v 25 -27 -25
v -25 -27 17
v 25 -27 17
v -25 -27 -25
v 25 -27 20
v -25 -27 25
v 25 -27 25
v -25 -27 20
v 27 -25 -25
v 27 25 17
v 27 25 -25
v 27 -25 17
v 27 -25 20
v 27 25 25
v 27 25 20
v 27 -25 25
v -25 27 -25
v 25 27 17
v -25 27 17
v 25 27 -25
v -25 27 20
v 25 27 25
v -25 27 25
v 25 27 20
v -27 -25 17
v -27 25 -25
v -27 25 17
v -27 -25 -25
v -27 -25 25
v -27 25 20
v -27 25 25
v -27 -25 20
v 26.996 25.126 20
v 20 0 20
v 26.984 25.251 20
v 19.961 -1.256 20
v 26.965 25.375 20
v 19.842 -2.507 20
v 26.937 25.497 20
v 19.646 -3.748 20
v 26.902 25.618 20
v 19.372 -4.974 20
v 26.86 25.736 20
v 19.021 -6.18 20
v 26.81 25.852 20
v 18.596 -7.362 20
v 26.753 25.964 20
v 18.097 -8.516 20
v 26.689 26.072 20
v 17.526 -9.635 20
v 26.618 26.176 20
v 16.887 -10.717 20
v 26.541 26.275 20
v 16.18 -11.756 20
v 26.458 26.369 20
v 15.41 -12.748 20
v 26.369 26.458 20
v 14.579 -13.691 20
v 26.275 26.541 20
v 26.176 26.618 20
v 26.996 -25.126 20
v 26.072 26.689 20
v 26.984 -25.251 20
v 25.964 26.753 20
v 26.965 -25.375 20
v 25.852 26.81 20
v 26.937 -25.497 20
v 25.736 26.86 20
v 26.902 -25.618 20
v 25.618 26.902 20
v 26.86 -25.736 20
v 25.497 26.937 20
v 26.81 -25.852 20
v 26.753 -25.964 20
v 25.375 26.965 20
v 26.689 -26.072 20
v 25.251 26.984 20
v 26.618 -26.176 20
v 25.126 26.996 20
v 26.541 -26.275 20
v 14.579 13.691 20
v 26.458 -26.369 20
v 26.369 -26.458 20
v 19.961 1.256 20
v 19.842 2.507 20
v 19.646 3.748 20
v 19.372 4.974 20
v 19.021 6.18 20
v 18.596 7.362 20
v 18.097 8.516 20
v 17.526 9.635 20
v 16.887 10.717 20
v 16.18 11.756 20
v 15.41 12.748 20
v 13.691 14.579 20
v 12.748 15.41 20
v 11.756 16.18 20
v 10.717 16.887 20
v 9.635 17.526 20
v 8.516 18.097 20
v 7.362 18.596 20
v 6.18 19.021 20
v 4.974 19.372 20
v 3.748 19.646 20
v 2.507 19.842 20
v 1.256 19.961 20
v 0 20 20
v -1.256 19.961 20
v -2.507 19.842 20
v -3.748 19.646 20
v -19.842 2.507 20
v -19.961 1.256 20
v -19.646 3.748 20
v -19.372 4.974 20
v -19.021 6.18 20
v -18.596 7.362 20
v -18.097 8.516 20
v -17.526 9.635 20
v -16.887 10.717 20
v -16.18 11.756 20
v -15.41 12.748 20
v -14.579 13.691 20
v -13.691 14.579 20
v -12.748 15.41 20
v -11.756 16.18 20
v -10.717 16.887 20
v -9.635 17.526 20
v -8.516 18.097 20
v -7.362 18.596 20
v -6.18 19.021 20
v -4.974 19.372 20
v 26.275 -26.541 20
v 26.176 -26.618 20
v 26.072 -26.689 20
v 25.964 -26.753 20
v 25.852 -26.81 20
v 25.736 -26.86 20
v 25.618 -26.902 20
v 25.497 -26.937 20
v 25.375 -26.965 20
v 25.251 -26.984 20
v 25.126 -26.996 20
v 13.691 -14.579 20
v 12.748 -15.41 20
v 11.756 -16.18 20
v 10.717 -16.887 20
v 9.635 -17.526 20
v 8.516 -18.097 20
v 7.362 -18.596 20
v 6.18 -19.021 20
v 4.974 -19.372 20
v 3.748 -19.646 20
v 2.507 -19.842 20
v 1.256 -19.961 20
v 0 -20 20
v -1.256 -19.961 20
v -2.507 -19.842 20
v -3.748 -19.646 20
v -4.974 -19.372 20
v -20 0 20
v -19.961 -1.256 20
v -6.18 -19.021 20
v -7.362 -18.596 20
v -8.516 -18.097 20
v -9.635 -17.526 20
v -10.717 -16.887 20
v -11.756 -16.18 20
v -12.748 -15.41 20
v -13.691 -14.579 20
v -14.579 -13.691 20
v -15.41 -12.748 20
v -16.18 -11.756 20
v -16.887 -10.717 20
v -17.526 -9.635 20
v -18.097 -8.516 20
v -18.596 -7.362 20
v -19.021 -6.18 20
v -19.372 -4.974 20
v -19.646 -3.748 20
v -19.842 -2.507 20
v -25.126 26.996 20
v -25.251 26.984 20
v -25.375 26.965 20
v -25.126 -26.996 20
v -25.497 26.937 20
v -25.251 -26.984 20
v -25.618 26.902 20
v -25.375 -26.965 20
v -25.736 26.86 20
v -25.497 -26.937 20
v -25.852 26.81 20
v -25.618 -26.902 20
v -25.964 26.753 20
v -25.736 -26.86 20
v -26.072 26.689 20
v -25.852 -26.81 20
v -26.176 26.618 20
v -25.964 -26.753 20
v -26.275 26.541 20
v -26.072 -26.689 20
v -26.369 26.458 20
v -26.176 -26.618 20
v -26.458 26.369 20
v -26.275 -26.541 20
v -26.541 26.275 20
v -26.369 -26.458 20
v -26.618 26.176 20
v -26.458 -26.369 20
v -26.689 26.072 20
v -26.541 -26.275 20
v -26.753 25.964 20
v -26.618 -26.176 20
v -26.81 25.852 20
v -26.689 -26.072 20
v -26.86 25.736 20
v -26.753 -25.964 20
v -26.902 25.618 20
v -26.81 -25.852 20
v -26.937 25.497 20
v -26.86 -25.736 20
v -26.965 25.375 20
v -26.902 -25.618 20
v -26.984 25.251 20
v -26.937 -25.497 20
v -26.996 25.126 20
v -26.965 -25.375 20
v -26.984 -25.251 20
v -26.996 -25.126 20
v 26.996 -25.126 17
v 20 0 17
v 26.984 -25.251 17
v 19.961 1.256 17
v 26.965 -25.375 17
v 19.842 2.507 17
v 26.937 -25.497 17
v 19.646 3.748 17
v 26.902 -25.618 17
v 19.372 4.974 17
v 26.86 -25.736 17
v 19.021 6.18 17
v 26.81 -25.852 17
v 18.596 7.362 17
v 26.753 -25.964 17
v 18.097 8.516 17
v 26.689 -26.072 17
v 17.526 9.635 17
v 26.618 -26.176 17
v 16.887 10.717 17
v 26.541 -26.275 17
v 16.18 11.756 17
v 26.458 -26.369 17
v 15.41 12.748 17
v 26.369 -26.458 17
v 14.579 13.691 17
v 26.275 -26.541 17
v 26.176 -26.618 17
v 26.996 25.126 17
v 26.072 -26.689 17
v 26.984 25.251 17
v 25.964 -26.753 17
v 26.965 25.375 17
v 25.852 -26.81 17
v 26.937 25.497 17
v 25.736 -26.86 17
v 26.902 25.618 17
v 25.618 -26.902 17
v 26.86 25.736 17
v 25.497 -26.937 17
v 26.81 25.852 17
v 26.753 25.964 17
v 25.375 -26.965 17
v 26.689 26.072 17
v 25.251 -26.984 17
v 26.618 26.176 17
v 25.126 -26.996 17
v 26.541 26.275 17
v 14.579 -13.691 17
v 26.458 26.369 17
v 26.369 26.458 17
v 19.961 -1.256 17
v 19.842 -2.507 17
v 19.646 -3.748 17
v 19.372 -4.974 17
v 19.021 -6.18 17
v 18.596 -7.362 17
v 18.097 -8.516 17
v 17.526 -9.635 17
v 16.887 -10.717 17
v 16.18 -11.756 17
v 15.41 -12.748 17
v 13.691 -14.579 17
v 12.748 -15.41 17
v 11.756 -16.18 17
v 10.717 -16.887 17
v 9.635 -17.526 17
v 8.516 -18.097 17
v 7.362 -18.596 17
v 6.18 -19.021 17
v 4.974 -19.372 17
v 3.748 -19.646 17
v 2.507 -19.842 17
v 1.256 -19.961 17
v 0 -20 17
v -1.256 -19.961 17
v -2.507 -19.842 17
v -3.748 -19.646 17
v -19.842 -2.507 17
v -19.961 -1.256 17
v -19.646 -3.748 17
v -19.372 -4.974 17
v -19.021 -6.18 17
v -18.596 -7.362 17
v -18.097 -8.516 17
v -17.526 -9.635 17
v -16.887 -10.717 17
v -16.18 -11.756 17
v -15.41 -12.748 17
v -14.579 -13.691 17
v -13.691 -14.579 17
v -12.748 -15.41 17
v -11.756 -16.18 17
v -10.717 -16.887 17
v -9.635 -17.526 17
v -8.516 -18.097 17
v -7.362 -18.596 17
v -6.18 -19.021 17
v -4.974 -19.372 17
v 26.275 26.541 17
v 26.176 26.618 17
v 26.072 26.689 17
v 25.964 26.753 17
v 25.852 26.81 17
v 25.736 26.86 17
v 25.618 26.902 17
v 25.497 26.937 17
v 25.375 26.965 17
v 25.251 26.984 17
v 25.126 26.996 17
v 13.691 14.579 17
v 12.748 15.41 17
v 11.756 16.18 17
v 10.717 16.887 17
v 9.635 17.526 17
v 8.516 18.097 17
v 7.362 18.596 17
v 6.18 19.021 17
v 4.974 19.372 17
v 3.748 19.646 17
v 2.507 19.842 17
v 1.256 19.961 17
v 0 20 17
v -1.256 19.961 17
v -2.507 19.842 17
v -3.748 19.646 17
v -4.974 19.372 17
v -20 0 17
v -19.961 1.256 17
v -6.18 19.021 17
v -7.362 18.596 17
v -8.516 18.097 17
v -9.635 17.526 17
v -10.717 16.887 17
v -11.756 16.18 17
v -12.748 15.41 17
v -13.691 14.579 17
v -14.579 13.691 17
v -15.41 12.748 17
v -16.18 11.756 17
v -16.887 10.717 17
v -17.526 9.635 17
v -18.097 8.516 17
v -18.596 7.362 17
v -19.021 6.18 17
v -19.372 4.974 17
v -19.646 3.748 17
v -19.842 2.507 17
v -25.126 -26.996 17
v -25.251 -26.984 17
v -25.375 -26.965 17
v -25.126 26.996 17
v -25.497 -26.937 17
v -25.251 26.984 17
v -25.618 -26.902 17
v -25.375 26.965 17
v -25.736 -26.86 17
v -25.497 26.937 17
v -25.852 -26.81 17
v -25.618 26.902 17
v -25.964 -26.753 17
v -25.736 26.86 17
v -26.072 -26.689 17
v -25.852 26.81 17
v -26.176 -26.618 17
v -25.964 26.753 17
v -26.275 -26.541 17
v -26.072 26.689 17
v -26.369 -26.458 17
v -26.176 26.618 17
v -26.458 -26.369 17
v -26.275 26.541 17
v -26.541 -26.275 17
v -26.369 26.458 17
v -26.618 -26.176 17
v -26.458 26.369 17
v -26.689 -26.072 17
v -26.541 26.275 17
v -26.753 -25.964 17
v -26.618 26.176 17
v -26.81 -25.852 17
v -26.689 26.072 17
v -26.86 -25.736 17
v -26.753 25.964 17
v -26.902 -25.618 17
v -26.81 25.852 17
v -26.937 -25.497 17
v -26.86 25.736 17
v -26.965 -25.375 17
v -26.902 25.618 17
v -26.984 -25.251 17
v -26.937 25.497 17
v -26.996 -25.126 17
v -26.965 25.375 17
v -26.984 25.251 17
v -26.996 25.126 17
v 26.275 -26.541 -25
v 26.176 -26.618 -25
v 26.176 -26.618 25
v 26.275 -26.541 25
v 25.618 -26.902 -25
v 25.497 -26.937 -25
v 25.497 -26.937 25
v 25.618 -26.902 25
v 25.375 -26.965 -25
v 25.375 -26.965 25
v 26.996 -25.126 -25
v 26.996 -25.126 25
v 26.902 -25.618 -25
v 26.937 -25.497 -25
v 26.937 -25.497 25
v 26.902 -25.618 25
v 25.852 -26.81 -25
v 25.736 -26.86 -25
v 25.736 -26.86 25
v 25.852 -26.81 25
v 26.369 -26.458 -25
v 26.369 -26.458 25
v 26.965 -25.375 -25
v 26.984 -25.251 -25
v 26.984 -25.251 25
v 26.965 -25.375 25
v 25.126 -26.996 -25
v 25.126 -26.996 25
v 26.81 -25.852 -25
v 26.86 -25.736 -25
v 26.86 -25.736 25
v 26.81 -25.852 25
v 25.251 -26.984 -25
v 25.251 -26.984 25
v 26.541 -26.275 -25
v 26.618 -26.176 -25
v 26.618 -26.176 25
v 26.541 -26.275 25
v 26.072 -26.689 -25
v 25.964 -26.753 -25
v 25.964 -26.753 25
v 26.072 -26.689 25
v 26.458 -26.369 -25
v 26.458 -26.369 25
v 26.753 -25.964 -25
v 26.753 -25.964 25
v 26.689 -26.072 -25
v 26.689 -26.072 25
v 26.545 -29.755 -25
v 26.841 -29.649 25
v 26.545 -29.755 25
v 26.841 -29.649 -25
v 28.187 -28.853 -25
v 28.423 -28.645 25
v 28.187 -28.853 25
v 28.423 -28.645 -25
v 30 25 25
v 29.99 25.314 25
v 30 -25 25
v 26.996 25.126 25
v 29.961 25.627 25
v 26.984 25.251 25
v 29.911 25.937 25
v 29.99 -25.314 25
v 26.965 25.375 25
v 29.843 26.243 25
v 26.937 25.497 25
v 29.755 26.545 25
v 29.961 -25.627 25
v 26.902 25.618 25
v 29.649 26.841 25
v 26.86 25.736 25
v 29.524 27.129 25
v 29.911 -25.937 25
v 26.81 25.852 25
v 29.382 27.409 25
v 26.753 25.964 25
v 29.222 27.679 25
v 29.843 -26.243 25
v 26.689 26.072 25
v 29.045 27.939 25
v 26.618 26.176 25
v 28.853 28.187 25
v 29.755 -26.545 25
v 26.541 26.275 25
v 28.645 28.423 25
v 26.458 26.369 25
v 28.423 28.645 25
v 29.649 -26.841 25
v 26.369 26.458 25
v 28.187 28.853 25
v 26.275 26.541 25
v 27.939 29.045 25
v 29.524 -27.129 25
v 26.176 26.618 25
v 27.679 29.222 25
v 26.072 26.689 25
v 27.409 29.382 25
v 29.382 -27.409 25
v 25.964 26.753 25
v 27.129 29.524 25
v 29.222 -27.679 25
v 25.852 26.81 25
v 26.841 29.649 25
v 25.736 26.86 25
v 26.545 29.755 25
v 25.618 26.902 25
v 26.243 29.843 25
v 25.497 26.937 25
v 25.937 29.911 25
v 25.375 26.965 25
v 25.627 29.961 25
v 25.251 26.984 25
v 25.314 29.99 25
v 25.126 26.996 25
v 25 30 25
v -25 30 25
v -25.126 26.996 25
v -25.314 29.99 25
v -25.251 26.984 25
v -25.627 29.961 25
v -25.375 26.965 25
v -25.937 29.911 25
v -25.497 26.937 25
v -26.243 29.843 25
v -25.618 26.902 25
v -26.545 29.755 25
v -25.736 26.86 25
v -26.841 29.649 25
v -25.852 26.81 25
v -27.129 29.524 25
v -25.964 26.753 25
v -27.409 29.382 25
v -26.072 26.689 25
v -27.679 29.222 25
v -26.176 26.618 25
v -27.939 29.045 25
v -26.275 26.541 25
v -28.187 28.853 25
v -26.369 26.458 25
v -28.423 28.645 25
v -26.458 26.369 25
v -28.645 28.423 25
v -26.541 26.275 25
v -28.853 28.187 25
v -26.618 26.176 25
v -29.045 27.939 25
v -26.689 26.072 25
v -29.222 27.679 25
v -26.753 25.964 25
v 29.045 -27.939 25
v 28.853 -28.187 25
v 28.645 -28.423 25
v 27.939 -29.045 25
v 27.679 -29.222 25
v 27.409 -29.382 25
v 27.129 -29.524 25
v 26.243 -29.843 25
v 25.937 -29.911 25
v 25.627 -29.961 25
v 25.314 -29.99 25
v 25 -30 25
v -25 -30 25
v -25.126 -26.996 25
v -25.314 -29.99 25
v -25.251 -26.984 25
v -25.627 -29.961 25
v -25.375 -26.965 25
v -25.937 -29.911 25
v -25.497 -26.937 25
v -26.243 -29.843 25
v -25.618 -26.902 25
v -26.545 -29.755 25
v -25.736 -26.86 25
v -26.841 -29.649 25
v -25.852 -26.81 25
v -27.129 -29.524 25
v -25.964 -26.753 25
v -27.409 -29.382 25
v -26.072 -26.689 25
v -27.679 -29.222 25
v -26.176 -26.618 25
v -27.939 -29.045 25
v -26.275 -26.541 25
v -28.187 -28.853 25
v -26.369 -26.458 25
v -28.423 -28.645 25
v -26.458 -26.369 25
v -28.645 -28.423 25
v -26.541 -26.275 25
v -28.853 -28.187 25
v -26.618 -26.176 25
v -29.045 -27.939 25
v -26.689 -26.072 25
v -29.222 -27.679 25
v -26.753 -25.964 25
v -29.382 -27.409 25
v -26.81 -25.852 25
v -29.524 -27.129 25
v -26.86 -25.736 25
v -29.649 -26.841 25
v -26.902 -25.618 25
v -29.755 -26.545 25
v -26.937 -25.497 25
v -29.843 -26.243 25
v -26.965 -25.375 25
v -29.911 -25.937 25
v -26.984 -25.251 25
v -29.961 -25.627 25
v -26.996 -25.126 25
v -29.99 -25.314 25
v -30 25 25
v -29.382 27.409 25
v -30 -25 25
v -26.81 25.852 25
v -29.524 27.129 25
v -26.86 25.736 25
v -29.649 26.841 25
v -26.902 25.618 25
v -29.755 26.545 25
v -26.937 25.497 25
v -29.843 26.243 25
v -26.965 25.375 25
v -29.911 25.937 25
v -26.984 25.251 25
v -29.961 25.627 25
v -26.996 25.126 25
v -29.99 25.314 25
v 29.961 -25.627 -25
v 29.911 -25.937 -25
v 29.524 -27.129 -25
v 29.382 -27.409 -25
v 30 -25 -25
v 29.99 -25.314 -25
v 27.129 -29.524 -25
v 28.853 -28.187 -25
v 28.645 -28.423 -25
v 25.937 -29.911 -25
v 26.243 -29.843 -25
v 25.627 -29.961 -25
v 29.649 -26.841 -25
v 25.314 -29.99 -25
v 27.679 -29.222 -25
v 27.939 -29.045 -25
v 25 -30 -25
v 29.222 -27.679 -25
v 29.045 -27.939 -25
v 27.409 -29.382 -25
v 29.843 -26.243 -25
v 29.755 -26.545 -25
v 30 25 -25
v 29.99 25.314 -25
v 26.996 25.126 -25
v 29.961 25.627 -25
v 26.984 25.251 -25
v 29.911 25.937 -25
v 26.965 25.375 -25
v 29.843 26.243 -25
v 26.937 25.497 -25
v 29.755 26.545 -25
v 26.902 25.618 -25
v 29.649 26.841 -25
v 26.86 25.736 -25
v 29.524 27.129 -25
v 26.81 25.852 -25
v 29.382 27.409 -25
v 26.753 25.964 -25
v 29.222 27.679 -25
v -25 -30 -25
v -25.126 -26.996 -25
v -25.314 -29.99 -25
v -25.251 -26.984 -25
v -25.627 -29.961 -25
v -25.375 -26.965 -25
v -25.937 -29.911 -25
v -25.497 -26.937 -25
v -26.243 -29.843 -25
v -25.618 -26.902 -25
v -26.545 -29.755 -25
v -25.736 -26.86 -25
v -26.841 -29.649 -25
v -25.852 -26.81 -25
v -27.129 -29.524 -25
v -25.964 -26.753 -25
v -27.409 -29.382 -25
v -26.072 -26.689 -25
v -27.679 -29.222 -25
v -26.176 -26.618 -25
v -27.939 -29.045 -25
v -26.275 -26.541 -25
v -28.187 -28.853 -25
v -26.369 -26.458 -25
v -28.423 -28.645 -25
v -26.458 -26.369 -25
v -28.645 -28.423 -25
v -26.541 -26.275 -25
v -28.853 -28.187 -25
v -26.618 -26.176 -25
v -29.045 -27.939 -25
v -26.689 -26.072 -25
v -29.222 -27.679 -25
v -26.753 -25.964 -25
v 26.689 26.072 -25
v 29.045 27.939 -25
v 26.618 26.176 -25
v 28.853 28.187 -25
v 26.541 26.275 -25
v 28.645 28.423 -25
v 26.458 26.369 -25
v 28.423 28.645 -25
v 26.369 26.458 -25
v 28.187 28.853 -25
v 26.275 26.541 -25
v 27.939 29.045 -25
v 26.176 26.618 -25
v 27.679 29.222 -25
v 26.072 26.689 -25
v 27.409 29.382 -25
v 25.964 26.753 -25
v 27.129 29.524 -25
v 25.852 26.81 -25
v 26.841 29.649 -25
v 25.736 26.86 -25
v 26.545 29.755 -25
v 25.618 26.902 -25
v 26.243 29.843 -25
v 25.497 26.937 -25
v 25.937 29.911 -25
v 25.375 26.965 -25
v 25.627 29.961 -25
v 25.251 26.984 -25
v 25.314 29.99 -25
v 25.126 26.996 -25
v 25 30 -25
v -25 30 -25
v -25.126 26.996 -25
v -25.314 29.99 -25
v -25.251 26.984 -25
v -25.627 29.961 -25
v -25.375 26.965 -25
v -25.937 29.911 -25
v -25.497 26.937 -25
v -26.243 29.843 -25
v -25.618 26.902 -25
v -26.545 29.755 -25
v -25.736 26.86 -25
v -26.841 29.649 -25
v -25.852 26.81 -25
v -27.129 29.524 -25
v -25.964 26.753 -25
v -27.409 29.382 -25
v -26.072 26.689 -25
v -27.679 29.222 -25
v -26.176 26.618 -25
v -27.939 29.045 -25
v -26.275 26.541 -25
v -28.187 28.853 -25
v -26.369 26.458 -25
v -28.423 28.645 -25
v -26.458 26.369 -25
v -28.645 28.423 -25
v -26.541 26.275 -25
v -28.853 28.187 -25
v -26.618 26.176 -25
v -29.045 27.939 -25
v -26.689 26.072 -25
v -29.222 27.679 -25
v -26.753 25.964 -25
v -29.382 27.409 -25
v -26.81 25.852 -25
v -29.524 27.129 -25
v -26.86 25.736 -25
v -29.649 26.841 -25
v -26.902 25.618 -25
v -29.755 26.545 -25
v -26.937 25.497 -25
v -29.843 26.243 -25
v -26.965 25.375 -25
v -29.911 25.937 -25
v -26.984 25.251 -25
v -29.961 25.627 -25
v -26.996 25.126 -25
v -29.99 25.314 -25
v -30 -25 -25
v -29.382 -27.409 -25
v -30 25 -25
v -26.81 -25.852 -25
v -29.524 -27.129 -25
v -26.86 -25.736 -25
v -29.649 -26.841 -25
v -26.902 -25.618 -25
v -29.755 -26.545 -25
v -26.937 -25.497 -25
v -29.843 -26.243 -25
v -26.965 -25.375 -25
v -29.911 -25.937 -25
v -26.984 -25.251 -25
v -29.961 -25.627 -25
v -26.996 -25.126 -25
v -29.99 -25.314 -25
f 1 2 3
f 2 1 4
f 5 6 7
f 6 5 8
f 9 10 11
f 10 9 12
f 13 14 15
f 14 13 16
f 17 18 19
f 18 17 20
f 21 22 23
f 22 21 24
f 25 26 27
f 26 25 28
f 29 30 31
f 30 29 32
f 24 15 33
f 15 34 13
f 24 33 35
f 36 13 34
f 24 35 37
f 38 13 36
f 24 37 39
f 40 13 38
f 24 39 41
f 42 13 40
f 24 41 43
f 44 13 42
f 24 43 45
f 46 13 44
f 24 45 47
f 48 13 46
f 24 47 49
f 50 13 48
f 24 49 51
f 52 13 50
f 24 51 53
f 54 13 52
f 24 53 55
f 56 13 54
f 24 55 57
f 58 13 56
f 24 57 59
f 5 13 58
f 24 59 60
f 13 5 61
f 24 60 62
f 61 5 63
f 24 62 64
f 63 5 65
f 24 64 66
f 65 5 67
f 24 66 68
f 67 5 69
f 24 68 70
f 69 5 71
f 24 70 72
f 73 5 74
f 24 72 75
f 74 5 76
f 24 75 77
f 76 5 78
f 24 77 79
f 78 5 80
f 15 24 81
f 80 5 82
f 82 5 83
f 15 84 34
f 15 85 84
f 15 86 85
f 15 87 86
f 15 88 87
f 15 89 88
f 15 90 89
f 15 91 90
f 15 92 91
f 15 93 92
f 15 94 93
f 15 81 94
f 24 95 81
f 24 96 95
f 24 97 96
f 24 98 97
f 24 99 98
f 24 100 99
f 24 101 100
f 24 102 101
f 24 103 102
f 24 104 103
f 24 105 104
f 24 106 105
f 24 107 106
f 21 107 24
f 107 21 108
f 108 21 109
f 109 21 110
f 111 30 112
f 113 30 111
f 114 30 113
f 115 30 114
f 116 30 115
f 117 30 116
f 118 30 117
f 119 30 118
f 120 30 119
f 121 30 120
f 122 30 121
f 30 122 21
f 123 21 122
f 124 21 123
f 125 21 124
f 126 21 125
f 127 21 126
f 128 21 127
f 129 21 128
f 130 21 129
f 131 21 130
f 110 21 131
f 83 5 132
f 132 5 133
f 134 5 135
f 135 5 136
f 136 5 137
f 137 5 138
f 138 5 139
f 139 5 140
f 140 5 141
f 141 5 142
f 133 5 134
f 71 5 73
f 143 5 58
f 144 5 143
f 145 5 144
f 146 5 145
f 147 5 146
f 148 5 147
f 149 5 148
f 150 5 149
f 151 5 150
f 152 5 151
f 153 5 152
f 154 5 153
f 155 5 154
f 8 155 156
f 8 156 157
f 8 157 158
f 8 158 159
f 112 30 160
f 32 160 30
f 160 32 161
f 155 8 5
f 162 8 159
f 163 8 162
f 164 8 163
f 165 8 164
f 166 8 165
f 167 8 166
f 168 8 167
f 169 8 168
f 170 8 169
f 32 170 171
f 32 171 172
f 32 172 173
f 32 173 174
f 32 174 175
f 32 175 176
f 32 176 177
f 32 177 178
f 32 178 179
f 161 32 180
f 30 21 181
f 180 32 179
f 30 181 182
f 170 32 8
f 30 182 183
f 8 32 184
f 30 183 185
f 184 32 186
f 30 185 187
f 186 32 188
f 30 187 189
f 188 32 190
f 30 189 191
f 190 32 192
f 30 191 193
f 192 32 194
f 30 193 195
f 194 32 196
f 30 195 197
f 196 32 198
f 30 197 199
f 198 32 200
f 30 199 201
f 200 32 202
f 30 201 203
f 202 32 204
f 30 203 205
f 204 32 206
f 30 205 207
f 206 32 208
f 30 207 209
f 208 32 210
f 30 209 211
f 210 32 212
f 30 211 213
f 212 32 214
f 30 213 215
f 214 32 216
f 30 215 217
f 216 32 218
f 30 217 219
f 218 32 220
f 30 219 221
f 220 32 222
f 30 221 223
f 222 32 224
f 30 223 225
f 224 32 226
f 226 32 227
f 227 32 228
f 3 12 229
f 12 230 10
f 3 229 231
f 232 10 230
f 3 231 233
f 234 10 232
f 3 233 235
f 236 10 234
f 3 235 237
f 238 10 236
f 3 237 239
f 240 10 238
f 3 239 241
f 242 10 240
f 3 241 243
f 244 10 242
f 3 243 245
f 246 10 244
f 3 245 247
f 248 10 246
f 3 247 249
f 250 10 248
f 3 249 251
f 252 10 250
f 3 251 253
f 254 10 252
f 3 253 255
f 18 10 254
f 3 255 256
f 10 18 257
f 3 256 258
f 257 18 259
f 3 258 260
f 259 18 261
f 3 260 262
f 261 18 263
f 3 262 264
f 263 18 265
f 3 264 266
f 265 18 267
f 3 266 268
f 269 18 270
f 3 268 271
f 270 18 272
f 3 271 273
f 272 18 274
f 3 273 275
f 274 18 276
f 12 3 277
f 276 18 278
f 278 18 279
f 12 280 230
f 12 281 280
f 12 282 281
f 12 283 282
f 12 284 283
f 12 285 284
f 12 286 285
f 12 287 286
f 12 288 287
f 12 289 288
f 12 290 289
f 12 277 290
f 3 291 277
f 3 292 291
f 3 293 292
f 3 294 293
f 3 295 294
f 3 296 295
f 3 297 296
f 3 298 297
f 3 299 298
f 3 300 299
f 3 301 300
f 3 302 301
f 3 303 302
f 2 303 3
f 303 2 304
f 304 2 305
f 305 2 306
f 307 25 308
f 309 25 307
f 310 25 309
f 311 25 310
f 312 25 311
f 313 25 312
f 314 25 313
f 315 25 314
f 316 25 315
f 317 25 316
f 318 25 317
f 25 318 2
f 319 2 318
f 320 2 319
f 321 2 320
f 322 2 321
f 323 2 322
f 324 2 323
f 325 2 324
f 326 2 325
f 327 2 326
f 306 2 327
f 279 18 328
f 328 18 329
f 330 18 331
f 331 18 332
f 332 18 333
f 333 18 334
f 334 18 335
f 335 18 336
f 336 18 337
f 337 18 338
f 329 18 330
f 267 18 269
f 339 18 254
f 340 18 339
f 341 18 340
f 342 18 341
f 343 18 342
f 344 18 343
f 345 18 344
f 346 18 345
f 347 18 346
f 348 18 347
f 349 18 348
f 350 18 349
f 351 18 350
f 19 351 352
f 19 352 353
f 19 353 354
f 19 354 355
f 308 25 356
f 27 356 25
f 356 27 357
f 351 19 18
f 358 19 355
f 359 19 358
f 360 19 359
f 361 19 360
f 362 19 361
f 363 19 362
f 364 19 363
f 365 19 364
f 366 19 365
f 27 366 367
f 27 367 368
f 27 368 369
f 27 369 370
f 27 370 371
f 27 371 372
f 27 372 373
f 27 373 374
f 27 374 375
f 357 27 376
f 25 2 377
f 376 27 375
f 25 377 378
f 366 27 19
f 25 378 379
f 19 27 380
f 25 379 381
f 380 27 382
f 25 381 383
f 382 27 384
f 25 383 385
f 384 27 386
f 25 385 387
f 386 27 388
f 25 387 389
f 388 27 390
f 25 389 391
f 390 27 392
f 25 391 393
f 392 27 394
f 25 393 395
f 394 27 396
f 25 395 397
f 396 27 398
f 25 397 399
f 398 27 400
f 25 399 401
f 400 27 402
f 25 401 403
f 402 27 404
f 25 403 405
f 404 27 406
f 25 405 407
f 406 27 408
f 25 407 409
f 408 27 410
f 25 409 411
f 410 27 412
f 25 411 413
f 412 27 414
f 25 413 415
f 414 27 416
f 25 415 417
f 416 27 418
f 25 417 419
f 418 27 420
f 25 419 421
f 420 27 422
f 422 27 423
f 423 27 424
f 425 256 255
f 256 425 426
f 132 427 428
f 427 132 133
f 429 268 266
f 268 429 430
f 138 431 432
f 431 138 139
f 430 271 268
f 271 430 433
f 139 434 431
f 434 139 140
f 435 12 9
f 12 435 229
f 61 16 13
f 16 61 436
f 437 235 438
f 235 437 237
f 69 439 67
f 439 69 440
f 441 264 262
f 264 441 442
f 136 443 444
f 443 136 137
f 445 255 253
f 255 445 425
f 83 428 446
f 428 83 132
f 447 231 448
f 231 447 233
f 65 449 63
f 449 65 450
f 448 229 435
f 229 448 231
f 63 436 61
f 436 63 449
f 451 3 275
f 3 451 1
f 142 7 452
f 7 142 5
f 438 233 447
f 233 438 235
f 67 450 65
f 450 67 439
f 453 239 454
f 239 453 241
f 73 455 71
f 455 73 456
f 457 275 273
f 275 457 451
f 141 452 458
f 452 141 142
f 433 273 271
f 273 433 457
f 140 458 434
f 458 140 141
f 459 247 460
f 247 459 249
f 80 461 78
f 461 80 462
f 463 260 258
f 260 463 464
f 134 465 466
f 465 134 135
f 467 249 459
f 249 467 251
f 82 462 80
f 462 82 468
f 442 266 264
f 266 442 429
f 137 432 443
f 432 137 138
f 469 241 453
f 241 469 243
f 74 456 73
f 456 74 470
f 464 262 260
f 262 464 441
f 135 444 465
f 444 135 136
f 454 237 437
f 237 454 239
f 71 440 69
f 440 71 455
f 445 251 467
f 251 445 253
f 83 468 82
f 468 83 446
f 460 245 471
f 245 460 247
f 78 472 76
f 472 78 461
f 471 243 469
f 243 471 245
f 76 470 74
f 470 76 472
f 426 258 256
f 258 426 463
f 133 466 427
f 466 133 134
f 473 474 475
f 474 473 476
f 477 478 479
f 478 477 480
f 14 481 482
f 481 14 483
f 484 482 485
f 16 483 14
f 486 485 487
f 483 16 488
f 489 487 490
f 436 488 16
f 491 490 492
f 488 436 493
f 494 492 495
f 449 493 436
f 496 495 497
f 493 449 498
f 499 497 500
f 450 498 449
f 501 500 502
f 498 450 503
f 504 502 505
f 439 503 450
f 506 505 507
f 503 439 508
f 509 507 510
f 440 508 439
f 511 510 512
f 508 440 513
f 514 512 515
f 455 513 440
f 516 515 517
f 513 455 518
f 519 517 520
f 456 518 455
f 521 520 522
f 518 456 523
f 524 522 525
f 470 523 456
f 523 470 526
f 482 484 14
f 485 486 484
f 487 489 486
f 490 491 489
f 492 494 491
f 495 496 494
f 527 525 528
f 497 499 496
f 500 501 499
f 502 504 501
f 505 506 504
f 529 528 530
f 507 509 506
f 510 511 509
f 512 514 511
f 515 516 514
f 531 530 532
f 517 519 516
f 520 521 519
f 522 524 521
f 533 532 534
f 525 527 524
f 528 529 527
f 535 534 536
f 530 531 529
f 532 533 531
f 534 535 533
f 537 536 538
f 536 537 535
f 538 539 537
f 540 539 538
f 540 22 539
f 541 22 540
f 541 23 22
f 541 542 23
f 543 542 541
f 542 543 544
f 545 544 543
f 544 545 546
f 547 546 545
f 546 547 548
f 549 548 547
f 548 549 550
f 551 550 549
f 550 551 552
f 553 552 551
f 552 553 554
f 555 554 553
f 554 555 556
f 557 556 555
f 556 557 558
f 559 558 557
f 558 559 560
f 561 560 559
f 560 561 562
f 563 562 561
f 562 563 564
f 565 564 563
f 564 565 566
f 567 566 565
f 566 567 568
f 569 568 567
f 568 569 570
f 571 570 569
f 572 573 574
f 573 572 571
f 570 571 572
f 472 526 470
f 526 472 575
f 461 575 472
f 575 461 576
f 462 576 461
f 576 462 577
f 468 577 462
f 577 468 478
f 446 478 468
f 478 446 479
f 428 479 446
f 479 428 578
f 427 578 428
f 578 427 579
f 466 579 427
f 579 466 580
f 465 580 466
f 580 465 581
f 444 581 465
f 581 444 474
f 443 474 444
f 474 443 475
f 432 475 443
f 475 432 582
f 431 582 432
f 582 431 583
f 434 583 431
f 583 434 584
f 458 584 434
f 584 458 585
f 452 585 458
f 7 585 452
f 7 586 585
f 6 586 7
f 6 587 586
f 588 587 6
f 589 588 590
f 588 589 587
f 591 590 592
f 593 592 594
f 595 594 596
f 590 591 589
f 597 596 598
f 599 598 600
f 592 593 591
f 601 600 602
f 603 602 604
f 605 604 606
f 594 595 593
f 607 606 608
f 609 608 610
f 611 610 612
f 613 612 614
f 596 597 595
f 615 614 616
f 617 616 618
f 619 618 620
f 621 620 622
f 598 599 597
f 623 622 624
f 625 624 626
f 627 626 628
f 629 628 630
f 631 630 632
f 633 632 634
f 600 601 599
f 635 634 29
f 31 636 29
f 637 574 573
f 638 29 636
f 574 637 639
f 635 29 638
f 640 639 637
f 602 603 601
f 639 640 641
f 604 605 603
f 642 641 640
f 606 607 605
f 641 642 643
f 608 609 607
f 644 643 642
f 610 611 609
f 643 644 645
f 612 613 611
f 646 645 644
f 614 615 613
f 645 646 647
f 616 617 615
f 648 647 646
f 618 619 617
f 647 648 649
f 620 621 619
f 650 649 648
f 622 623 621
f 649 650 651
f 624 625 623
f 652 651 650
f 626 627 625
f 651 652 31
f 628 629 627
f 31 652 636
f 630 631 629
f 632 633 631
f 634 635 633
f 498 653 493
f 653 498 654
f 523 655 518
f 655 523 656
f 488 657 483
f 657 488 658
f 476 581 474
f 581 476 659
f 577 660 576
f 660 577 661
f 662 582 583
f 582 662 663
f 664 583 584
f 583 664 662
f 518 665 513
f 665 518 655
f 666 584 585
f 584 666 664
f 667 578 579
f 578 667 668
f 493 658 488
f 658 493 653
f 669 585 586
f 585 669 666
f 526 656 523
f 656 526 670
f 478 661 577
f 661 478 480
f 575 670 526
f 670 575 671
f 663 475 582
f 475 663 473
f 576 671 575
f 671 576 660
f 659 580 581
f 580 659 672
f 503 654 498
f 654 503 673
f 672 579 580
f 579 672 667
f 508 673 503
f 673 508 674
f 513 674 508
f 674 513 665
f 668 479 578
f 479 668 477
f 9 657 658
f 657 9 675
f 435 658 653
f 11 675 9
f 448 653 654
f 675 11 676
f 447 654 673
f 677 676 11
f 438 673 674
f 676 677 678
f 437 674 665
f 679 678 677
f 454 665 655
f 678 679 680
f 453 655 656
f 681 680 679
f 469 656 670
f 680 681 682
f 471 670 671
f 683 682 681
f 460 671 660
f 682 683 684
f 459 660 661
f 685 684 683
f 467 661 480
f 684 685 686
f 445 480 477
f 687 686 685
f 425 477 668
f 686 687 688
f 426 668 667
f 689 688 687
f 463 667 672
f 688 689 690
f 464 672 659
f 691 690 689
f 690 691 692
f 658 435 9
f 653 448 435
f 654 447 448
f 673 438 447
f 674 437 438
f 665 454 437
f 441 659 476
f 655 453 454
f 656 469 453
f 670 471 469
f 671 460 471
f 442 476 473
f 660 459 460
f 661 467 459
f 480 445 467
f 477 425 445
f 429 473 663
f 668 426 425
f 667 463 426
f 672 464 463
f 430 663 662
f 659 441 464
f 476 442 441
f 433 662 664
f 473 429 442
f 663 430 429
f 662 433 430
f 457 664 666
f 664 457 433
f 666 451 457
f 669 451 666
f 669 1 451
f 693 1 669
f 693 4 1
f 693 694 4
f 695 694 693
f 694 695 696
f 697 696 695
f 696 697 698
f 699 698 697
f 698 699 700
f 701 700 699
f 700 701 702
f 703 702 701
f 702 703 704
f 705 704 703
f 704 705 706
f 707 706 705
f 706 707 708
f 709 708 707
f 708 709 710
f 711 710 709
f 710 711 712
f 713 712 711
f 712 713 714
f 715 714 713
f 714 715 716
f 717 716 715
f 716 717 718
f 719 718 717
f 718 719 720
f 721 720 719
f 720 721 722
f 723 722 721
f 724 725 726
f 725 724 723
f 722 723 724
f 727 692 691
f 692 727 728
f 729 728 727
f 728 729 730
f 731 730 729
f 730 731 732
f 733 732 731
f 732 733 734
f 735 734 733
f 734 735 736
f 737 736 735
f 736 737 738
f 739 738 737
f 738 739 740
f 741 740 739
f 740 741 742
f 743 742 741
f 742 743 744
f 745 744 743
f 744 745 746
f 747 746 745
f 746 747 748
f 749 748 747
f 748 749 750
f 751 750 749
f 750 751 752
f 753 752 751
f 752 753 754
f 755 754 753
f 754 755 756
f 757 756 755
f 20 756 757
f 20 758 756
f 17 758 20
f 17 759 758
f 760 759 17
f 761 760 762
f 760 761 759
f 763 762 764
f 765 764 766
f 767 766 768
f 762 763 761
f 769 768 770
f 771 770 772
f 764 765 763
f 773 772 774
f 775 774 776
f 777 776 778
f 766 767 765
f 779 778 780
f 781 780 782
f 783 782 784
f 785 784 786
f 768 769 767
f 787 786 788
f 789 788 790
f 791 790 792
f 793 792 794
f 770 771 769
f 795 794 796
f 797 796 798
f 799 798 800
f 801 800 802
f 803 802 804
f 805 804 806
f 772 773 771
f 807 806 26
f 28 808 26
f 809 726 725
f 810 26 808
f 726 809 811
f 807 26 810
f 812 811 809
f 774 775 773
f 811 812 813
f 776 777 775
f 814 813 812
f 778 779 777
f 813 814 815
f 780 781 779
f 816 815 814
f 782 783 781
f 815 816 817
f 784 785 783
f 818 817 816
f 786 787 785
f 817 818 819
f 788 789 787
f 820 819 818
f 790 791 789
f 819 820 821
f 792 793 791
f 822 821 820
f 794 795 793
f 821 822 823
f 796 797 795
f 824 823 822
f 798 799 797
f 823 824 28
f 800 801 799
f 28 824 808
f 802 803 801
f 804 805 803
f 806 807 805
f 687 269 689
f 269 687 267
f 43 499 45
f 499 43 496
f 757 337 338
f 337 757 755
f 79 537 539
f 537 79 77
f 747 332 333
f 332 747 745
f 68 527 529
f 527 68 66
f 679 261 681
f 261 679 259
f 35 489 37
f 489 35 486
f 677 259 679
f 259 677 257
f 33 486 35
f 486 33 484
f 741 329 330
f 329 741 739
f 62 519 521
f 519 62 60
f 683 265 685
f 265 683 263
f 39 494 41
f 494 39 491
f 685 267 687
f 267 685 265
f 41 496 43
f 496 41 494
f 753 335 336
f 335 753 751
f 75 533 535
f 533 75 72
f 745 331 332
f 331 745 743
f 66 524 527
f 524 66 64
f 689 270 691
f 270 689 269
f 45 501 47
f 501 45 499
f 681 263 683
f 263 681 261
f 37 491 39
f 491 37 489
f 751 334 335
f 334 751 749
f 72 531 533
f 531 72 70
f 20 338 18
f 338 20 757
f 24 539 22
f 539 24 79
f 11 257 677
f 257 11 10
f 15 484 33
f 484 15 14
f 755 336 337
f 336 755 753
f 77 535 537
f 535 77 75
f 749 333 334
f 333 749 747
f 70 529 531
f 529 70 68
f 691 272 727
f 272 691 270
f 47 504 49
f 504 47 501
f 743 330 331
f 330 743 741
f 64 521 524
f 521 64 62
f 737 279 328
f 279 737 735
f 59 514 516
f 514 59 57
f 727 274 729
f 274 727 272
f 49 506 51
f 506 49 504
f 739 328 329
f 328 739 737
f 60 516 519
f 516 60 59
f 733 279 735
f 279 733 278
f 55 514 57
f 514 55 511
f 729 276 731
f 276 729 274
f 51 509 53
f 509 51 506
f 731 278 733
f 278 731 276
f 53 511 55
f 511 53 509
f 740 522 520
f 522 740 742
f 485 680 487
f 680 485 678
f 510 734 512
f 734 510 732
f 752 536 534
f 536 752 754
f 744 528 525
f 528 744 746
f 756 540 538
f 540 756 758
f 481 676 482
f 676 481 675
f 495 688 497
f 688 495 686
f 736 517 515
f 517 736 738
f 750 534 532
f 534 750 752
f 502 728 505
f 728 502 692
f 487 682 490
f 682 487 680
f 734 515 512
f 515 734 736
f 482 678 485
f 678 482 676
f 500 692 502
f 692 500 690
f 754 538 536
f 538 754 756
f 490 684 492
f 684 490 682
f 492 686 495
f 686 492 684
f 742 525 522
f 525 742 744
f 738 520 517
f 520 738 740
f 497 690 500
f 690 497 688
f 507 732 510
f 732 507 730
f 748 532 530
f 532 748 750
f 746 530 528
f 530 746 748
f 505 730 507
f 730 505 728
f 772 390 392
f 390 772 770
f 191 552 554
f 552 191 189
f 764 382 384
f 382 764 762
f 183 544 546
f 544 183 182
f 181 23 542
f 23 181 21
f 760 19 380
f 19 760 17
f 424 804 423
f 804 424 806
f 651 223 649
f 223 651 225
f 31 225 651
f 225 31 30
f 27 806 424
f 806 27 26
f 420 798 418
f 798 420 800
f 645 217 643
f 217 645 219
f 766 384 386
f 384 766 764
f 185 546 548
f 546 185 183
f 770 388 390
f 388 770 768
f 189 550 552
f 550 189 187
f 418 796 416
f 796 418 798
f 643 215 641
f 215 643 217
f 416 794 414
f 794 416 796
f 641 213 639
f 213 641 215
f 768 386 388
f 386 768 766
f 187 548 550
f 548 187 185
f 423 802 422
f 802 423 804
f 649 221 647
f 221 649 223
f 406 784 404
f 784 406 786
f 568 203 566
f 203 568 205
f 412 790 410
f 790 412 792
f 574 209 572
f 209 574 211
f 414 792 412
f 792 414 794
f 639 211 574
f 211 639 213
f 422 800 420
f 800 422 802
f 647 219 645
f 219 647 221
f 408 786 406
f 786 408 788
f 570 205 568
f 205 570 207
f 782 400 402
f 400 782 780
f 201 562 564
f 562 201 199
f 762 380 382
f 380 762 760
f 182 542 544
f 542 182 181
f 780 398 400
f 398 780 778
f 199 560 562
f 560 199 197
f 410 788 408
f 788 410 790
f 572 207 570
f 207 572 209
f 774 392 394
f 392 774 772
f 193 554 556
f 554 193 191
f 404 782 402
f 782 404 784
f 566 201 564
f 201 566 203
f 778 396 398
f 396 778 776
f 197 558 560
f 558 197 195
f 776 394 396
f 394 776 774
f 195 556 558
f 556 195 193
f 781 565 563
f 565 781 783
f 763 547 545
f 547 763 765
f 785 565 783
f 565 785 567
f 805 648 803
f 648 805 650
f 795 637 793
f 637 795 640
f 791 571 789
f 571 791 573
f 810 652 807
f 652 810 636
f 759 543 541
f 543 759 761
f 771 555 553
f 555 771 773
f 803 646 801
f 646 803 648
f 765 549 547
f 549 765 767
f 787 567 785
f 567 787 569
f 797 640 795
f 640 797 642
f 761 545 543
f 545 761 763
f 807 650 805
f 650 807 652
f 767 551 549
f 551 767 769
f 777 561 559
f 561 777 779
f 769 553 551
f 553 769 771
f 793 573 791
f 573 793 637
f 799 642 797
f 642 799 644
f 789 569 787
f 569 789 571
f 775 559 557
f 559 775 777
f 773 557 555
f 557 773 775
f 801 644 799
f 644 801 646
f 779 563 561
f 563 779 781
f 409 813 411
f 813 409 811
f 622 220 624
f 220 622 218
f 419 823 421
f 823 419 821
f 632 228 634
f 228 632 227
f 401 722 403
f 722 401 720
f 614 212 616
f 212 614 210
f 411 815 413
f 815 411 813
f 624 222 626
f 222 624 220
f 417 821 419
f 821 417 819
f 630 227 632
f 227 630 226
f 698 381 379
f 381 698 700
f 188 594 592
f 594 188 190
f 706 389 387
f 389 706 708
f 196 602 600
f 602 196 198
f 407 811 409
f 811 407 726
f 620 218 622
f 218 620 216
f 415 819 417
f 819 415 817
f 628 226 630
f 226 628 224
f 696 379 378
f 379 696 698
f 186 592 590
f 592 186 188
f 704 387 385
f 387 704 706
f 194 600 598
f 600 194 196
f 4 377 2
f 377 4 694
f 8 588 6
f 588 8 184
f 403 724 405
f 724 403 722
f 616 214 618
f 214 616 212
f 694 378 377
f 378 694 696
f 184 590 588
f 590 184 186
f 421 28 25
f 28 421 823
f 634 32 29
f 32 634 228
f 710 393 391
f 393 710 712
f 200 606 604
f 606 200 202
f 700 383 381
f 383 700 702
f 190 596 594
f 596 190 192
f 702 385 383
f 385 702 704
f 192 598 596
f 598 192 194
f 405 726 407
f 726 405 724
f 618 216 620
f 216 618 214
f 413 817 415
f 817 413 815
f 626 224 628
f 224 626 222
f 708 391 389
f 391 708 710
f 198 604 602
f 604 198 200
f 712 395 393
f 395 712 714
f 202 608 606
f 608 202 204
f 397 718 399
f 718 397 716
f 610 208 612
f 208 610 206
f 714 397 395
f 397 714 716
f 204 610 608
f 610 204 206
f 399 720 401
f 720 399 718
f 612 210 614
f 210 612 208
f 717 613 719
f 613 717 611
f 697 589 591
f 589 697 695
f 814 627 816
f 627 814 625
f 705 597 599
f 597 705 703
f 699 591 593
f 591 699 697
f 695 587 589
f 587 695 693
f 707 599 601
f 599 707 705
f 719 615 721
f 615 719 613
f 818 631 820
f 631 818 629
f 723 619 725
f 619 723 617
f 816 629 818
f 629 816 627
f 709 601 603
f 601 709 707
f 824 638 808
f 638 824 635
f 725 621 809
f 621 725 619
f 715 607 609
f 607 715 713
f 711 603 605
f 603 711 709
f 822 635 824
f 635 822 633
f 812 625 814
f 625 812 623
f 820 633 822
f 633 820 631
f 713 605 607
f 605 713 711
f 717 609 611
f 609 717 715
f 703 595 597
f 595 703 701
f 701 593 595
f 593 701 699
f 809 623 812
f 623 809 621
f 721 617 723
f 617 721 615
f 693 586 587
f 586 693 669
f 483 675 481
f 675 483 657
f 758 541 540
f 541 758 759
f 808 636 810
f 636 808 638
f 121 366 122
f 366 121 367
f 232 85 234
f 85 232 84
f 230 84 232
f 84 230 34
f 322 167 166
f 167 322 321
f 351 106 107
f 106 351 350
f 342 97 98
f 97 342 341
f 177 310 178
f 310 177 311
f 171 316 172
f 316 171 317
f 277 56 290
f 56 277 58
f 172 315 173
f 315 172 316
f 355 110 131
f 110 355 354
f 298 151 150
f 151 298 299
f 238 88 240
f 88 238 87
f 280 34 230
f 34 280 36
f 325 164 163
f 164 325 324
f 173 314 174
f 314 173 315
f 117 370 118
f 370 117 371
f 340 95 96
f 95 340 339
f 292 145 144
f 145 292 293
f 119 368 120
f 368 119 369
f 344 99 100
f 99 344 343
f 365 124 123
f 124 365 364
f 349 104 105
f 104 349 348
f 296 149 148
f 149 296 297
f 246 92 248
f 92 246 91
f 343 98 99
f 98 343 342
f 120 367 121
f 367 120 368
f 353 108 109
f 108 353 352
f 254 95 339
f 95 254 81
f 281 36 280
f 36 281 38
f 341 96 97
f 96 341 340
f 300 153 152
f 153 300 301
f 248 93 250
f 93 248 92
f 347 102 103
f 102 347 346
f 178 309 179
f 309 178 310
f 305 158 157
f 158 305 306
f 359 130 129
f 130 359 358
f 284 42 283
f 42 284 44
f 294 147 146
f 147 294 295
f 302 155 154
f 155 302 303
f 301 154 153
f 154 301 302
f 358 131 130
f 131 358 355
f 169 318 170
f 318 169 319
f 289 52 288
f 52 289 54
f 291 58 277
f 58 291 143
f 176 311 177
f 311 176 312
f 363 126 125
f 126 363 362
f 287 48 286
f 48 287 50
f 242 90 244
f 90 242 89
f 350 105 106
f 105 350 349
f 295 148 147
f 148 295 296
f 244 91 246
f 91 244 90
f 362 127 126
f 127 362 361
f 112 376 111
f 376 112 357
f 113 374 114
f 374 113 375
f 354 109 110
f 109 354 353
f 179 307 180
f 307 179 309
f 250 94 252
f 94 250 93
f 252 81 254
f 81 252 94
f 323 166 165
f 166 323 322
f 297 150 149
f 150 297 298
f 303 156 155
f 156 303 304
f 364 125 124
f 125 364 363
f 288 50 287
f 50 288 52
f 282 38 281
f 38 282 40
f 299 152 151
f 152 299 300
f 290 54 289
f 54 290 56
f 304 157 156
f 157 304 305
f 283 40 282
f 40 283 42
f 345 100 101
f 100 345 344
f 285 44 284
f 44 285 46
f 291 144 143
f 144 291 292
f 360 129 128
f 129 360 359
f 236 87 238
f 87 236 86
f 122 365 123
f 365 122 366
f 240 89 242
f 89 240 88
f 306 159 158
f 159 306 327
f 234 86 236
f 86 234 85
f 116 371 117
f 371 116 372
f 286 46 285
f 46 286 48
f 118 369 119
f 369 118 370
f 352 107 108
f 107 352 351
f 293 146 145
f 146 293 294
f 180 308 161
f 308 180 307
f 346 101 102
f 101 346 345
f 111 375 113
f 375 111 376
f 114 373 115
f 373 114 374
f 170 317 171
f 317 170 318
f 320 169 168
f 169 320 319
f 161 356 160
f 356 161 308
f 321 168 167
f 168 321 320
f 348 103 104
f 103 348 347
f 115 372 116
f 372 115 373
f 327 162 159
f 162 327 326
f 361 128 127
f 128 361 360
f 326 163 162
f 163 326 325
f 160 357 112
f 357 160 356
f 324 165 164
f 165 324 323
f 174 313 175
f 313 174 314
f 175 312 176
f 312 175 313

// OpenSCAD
//CUSTOMIZER VARIABLES

//	Number of sides for the Microphone flag
number_of_sides = 4;	//	[3:12]

//	This is the width of the logo area, margin for the rounding will be added (mm)
width_of_logo = 50;

//	This is the height of the logo area (mm)
height_of_logo = 50;

//	This is the diameter of the hole for the microphone (mm)
hole_diameter = 40;

//	Here you can select if you want a bottom plate too, or just the top one
use_bottom = "false";	//	[true,false]

//CUSTOMIZER VARIABLES END

resolution = 100*1;

module flag(size, height, sides, hole, bottom)
{
	difference()
	{
		union()
		{
			difference()
			{
				union()
				{
					translate([0, 0, height/2-3/2-5])
						cylinder(h = 3, r1 = sqrt((tan((90+((sides-3)*90))/sides)*size/2)*(tan((90+((sides-3)*90))/sides)*size/2)+(size/2)*(size/2))+4, r2 = sqrt((tan((90+((sides-3)*90))/sides)*size/2)*(tan((90+((sides-3)*90))/sides)*size/2)+(size/2)*(size/2))+4, center = true, $fn = resolution);
					if (bottom == "true")
					{
						translate([0, 0, -height/2+3/2])
							cylinder(h = 3, r1 = sqrt((tan((90+((sides-3)*90))/sides)*size/2)*(tan((90+((sides-3)*90))/sides)*size/2)+(size/2)*(size/2))+4, r2 = sqrt((tan((90+((sides-3)*90))/sides)*size/2)*(tan((90+((sides-3)*90))/sides)*size/2)+(size/2)*(size/2))+4, center = true, $fn = resolution);
					}
				}
				union()
				{
					for ( i = [0 : sides-1] )
					{		
						rotate(360/sides*i, [0, 0, 1])
						translate([0, -(tan((90+((sides-3)*90))/sides)*size/2)-2-30/2, 0]) //distance from center
							cube([size+10, 30, height], center = true); // side block

					}
				}
			}
			for ( i = [0 : sides-1] )
			{		
				rotate(360/sides*i, [0, 0, 1])
				translate([0, -(tan((90+((sides-3)*90))/sides)*size/2)-5+3/2, 0]) //distance from center
					cube([size, 3, height], center = true); // side

				difference()
				{
					union()
					{
						rotate(360/sides*i, [0, 0, 1]) // follow sides
						translate([size/2, -(tan((90+((sides-3)*90))/sides)*size/2), 0]) // move to end of side
							cylinder(h = height, r1 = 5, r2 = 5, center = true, $fn = resolution); // outer corner diameter
					}
					union()
					{
						rotate(360/sides*i, [0, 0, 1]) // follow sides
						translate([size/2, -(tan((90+((sides-3)*90))/sides)*size/2), 0]) // move to end of side
							cylinder(h = height+1, r1 = 2, r2 = 2, center = true, $fn = resolution); // inner corner diameter		

						rotate(360/sides*i, [0, 0, 1]) // follow sides
						translate([size/2-10, -(tan((90+((sides-3)*90))/sides)*size/2), 0]) // move to end of side
							cube([20, 20, height+1], center = true);

						rotate(360/sides*i, [0, 0, 1])
						translate([size/2, -(tan((90+((sides-3)*90))/sides)*size/2), 0])
						rotate(360/sides+180, [0, 0, 1])
						translate([-10, 0, 0])
							cube([20, 20, height+1], center = true);
					}
				}
			}
		}
		union()
		{
			cylinder(h = height+1, r = hole/2, center = true, $fn = resolution);
		}
	}
}

// called with customizer parameters
flag(width_of_logo, height_of_logo, number_of_sides, hole_diameter, use_bottom);

//flag(90, 40, 3, 40, "false");

//flag(60, 65, 4, 40, "false");

//flag(45, 30, 5, 40, "false");

//flag(40, 40, 6, 40, "false");

//flag(30, 35, 7, 40, "false");

//flag(45, 45, 4, 35, "true");
